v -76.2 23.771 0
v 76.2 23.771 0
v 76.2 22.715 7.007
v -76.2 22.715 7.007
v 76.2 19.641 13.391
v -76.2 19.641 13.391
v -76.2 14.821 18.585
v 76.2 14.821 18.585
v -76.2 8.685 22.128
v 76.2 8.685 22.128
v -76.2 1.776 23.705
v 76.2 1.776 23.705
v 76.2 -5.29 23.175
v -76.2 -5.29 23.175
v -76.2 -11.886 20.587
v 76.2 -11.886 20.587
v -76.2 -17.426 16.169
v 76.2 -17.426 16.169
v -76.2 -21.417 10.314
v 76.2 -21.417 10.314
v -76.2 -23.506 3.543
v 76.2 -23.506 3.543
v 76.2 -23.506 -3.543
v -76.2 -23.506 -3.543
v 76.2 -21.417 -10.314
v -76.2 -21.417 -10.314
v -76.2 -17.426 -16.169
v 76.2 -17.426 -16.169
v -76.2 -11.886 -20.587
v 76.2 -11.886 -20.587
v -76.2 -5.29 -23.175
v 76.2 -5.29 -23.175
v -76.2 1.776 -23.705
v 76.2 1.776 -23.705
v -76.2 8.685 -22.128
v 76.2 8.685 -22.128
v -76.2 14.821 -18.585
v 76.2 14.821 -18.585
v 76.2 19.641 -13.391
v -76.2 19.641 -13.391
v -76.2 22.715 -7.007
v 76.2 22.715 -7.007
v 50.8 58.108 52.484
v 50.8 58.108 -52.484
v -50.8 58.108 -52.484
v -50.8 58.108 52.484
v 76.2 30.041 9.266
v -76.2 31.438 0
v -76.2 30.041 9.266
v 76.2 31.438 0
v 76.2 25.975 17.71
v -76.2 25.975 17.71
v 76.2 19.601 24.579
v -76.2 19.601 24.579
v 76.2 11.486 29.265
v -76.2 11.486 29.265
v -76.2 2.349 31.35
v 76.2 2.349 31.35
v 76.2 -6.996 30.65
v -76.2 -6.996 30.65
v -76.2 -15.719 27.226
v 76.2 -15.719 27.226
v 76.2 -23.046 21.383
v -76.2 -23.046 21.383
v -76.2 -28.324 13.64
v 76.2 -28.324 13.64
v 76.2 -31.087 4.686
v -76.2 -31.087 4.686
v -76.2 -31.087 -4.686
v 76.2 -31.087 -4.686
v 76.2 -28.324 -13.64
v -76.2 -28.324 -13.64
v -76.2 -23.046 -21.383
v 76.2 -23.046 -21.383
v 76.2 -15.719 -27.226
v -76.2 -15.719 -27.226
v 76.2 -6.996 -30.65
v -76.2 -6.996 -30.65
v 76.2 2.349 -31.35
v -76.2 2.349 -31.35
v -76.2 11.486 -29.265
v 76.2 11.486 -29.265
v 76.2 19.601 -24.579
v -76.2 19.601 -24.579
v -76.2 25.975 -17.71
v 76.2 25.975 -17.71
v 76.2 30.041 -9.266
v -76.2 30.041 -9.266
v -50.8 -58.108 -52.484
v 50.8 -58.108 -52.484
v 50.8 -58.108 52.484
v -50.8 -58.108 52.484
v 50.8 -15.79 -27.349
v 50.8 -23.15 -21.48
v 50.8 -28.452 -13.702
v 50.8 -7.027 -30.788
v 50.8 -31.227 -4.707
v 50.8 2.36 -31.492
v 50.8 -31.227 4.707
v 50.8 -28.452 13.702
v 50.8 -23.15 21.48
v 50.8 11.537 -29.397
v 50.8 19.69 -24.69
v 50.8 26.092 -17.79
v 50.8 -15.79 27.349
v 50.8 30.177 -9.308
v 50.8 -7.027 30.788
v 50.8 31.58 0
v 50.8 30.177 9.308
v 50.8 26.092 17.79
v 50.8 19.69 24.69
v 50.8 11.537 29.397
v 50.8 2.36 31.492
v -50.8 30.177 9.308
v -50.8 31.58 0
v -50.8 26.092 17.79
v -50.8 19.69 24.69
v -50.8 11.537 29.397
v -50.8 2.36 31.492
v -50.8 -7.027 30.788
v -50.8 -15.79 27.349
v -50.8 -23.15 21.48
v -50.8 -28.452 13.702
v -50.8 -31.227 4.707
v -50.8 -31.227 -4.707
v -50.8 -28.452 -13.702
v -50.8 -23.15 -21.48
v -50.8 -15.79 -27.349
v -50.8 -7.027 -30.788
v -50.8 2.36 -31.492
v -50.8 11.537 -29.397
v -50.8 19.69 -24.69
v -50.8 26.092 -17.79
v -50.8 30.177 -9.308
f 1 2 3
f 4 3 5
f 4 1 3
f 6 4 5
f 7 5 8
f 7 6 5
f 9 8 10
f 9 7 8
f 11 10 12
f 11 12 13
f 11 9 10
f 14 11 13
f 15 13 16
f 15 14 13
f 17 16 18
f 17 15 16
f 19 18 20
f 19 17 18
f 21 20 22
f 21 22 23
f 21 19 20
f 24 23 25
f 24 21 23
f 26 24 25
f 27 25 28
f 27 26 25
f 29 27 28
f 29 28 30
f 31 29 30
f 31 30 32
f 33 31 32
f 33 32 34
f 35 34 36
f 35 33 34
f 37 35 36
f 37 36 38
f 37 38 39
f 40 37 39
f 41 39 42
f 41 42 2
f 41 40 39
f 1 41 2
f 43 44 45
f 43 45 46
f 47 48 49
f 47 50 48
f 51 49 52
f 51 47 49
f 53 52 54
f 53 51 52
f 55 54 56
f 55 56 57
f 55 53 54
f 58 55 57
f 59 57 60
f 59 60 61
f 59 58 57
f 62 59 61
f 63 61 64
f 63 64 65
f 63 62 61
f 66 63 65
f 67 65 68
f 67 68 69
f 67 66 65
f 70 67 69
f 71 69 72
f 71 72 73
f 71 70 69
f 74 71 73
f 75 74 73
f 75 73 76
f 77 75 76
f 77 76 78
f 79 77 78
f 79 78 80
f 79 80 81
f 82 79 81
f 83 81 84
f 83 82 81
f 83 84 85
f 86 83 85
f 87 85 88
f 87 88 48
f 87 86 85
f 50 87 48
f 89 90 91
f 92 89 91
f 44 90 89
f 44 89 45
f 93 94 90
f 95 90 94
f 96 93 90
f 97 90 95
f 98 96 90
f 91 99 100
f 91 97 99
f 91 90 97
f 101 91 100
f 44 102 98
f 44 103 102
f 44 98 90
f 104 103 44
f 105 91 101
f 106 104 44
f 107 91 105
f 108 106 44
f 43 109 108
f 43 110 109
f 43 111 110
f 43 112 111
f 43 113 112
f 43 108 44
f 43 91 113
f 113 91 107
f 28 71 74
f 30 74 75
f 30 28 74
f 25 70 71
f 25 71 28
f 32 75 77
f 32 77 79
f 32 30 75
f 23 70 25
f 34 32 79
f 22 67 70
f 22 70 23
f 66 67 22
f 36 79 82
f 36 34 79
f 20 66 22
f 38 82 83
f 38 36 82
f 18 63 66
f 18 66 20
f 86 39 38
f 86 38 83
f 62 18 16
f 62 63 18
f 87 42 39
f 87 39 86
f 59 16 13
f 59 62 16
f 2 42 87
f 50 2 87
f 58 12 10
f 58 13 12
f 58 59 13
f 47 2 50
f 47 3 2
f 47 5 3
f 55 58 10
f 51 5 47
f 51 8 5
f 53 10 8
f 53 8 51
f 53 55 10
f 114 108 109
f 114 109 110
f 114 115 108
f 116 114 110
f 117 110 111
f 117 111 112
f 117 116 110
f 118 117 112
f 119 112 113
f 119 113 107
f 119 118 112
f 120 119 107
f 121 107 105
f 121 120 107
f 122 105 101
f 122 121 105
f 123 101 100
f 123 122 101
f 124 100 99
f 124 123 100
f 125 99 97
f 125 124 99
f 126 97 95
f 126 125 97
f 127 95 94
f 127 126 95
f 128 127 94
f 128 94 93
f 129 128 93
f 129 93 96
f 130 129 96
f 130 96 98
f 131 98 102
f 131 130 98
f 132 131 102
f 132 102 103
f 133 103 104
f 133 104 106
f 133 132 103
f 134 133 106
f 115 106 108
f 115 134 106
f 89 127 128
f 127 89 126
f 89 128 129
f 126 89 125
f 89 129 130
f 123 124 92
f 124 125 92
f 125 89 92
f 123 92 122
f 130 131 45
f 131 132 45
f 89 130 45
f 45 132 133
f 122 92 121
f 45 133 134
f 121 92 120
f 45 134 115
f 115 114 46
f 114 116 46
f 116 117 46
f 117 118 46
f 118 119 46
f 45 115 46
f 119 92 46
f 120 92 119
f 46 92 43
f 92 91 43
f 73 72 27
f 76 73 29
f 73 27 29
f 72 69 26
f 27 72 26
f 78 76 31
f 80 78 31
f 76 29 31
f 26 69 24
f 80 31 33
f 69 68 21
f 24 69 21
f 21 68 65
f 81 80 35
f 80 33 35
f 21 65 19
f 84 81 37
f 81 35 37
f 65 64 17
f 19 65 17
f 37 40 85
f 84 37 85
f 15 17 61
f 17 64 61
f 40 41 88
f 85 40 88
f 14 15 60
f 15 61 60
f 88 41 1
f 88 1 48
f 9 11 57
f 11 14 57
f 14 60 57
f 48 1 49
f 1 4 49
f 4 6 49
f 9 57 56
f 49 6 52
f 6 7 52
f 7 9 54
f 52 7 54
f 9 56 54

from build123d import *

# Parameters (mm, degrees)
F0_W     = 116.2151992321
F0_H     = 104.9675941467
F0_R     = 31.5798235418
F1_DEPTH = 50.8
F2_R     = 31.4378135925
F2_R_2   = 23.771453385
F3_DEPTH = 76.2


# Not quite as in the source:
# - a feature of the source that left no trace in its solid (it failed there, or was rolled back) is left out


with BuildPart() as f1:
    # F0 (on Right) → F1 (new body, symmetric)
    with BuildSketch(Plane.YZ):
        Rectangle(F0_W, F0_H)
        Circle(F0_R, mode=Mode.SUBTRACT)
    extrude(amount=F1_DEPTH, both=True)


with BuildPart() as f3:
    # F2 (on Right) → F3 (new body, symmetric)
    with BuildSketch(Plane.YZ):
        Circle(F2_R)
        Circle(F2_R_2, mode=Mode.SUBTRACT)
    extrude(amount=F3_DEPTH, both=True)


solid = Compound([f1.part, f3.part])
